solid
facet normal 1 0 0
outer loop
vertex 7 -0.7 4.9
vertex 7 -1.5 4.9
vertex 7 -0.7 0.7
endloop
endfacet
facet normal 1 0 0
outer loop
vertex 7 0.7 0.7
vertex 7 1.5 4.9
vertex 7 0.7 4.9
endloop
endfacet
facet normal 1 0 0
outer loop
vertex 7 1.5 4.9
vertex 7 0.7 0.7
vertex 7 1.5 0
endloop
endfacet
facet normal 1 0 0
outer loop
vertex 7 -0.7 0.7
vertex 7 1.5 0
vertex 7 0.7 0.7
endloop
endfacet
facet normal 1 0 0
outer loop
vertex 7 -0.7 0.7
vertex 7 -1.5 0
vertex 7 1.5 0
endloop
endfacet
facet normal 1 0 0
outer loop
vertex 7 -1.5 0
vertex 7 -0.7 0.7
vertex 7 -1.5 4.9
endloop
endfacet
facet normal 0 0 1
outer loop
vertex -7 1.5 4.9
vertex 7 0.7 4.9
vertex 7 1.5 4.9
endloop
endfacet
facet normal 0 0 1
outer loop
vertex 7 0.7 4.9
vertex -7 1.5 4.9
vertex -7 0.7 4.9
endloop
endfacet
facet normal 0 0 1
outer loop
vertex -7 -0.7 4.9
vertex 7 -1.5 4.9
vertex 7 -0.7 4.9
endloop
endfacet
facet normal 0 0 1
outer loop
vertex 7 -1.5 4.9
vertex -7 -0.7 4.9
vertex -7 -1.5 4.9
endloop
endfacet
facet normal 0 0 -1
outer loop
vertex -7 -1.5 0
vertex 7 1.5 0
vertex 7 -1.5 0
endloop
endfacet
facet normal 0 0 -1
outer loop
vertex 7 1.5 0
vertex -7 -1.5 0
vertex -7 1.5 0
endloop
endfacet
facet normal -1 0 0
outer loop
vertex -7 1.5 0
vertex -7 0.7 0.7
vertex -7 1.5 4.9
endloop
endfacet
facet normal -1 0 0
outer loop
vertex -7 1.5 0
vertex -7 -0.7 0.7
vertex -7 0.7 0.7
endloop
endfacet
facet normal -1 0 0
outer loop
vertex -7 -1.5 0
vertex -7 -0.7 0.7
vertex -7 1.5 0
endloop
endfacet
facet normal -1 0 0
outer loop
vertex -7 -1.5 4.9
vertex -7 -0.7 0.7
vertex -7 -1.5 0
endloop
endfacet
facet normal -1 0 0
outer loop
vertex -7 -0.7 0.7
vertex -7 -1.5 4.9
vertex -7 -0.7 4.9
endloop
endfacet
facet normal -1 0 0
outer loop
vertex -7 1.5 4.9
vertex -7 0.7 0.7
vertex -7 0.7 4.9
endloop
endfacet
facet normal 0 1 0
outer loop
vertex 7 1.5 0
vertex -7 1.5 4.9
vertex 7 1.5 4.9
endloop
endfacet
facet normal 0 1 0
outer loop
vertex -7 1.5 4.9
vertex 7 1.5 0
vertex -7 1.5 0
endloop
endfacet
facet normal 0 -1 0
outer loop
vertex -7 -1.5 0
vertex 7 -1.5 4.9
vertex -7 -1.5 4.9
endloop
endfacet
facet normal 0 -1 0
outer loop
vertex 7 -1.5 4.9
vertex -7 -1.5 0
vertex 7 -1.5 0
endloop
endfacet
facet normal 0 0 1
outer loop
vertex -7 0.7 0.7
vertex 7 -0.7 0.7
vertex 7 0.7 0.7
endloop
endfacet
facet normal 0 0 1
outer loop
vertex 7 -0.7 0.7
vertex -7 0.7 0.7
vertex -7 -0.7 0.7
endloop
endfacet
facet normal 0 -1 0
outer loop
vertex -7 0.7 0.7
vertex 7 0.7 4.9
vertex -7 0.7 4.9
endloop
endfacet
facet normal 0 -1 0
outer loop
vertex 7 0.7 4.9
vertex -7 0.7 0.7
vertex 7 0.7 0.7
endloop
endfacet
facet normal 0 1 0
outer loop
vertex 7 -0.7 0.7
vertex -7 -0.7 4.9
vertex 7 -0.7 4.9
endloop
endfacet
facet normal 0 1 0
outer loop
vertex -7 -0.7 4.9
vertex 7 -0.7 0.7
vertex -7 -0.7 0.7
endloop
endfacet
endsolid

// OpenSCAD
difference() {
  translate([0, 0, (4.2+0.7)/2]) cube([14, 3, 4.2+0.7], center=true);
  translate([0, 0, 4.2/2+0.7]) cube([14, 1.4, 4.2], center=true);
}
